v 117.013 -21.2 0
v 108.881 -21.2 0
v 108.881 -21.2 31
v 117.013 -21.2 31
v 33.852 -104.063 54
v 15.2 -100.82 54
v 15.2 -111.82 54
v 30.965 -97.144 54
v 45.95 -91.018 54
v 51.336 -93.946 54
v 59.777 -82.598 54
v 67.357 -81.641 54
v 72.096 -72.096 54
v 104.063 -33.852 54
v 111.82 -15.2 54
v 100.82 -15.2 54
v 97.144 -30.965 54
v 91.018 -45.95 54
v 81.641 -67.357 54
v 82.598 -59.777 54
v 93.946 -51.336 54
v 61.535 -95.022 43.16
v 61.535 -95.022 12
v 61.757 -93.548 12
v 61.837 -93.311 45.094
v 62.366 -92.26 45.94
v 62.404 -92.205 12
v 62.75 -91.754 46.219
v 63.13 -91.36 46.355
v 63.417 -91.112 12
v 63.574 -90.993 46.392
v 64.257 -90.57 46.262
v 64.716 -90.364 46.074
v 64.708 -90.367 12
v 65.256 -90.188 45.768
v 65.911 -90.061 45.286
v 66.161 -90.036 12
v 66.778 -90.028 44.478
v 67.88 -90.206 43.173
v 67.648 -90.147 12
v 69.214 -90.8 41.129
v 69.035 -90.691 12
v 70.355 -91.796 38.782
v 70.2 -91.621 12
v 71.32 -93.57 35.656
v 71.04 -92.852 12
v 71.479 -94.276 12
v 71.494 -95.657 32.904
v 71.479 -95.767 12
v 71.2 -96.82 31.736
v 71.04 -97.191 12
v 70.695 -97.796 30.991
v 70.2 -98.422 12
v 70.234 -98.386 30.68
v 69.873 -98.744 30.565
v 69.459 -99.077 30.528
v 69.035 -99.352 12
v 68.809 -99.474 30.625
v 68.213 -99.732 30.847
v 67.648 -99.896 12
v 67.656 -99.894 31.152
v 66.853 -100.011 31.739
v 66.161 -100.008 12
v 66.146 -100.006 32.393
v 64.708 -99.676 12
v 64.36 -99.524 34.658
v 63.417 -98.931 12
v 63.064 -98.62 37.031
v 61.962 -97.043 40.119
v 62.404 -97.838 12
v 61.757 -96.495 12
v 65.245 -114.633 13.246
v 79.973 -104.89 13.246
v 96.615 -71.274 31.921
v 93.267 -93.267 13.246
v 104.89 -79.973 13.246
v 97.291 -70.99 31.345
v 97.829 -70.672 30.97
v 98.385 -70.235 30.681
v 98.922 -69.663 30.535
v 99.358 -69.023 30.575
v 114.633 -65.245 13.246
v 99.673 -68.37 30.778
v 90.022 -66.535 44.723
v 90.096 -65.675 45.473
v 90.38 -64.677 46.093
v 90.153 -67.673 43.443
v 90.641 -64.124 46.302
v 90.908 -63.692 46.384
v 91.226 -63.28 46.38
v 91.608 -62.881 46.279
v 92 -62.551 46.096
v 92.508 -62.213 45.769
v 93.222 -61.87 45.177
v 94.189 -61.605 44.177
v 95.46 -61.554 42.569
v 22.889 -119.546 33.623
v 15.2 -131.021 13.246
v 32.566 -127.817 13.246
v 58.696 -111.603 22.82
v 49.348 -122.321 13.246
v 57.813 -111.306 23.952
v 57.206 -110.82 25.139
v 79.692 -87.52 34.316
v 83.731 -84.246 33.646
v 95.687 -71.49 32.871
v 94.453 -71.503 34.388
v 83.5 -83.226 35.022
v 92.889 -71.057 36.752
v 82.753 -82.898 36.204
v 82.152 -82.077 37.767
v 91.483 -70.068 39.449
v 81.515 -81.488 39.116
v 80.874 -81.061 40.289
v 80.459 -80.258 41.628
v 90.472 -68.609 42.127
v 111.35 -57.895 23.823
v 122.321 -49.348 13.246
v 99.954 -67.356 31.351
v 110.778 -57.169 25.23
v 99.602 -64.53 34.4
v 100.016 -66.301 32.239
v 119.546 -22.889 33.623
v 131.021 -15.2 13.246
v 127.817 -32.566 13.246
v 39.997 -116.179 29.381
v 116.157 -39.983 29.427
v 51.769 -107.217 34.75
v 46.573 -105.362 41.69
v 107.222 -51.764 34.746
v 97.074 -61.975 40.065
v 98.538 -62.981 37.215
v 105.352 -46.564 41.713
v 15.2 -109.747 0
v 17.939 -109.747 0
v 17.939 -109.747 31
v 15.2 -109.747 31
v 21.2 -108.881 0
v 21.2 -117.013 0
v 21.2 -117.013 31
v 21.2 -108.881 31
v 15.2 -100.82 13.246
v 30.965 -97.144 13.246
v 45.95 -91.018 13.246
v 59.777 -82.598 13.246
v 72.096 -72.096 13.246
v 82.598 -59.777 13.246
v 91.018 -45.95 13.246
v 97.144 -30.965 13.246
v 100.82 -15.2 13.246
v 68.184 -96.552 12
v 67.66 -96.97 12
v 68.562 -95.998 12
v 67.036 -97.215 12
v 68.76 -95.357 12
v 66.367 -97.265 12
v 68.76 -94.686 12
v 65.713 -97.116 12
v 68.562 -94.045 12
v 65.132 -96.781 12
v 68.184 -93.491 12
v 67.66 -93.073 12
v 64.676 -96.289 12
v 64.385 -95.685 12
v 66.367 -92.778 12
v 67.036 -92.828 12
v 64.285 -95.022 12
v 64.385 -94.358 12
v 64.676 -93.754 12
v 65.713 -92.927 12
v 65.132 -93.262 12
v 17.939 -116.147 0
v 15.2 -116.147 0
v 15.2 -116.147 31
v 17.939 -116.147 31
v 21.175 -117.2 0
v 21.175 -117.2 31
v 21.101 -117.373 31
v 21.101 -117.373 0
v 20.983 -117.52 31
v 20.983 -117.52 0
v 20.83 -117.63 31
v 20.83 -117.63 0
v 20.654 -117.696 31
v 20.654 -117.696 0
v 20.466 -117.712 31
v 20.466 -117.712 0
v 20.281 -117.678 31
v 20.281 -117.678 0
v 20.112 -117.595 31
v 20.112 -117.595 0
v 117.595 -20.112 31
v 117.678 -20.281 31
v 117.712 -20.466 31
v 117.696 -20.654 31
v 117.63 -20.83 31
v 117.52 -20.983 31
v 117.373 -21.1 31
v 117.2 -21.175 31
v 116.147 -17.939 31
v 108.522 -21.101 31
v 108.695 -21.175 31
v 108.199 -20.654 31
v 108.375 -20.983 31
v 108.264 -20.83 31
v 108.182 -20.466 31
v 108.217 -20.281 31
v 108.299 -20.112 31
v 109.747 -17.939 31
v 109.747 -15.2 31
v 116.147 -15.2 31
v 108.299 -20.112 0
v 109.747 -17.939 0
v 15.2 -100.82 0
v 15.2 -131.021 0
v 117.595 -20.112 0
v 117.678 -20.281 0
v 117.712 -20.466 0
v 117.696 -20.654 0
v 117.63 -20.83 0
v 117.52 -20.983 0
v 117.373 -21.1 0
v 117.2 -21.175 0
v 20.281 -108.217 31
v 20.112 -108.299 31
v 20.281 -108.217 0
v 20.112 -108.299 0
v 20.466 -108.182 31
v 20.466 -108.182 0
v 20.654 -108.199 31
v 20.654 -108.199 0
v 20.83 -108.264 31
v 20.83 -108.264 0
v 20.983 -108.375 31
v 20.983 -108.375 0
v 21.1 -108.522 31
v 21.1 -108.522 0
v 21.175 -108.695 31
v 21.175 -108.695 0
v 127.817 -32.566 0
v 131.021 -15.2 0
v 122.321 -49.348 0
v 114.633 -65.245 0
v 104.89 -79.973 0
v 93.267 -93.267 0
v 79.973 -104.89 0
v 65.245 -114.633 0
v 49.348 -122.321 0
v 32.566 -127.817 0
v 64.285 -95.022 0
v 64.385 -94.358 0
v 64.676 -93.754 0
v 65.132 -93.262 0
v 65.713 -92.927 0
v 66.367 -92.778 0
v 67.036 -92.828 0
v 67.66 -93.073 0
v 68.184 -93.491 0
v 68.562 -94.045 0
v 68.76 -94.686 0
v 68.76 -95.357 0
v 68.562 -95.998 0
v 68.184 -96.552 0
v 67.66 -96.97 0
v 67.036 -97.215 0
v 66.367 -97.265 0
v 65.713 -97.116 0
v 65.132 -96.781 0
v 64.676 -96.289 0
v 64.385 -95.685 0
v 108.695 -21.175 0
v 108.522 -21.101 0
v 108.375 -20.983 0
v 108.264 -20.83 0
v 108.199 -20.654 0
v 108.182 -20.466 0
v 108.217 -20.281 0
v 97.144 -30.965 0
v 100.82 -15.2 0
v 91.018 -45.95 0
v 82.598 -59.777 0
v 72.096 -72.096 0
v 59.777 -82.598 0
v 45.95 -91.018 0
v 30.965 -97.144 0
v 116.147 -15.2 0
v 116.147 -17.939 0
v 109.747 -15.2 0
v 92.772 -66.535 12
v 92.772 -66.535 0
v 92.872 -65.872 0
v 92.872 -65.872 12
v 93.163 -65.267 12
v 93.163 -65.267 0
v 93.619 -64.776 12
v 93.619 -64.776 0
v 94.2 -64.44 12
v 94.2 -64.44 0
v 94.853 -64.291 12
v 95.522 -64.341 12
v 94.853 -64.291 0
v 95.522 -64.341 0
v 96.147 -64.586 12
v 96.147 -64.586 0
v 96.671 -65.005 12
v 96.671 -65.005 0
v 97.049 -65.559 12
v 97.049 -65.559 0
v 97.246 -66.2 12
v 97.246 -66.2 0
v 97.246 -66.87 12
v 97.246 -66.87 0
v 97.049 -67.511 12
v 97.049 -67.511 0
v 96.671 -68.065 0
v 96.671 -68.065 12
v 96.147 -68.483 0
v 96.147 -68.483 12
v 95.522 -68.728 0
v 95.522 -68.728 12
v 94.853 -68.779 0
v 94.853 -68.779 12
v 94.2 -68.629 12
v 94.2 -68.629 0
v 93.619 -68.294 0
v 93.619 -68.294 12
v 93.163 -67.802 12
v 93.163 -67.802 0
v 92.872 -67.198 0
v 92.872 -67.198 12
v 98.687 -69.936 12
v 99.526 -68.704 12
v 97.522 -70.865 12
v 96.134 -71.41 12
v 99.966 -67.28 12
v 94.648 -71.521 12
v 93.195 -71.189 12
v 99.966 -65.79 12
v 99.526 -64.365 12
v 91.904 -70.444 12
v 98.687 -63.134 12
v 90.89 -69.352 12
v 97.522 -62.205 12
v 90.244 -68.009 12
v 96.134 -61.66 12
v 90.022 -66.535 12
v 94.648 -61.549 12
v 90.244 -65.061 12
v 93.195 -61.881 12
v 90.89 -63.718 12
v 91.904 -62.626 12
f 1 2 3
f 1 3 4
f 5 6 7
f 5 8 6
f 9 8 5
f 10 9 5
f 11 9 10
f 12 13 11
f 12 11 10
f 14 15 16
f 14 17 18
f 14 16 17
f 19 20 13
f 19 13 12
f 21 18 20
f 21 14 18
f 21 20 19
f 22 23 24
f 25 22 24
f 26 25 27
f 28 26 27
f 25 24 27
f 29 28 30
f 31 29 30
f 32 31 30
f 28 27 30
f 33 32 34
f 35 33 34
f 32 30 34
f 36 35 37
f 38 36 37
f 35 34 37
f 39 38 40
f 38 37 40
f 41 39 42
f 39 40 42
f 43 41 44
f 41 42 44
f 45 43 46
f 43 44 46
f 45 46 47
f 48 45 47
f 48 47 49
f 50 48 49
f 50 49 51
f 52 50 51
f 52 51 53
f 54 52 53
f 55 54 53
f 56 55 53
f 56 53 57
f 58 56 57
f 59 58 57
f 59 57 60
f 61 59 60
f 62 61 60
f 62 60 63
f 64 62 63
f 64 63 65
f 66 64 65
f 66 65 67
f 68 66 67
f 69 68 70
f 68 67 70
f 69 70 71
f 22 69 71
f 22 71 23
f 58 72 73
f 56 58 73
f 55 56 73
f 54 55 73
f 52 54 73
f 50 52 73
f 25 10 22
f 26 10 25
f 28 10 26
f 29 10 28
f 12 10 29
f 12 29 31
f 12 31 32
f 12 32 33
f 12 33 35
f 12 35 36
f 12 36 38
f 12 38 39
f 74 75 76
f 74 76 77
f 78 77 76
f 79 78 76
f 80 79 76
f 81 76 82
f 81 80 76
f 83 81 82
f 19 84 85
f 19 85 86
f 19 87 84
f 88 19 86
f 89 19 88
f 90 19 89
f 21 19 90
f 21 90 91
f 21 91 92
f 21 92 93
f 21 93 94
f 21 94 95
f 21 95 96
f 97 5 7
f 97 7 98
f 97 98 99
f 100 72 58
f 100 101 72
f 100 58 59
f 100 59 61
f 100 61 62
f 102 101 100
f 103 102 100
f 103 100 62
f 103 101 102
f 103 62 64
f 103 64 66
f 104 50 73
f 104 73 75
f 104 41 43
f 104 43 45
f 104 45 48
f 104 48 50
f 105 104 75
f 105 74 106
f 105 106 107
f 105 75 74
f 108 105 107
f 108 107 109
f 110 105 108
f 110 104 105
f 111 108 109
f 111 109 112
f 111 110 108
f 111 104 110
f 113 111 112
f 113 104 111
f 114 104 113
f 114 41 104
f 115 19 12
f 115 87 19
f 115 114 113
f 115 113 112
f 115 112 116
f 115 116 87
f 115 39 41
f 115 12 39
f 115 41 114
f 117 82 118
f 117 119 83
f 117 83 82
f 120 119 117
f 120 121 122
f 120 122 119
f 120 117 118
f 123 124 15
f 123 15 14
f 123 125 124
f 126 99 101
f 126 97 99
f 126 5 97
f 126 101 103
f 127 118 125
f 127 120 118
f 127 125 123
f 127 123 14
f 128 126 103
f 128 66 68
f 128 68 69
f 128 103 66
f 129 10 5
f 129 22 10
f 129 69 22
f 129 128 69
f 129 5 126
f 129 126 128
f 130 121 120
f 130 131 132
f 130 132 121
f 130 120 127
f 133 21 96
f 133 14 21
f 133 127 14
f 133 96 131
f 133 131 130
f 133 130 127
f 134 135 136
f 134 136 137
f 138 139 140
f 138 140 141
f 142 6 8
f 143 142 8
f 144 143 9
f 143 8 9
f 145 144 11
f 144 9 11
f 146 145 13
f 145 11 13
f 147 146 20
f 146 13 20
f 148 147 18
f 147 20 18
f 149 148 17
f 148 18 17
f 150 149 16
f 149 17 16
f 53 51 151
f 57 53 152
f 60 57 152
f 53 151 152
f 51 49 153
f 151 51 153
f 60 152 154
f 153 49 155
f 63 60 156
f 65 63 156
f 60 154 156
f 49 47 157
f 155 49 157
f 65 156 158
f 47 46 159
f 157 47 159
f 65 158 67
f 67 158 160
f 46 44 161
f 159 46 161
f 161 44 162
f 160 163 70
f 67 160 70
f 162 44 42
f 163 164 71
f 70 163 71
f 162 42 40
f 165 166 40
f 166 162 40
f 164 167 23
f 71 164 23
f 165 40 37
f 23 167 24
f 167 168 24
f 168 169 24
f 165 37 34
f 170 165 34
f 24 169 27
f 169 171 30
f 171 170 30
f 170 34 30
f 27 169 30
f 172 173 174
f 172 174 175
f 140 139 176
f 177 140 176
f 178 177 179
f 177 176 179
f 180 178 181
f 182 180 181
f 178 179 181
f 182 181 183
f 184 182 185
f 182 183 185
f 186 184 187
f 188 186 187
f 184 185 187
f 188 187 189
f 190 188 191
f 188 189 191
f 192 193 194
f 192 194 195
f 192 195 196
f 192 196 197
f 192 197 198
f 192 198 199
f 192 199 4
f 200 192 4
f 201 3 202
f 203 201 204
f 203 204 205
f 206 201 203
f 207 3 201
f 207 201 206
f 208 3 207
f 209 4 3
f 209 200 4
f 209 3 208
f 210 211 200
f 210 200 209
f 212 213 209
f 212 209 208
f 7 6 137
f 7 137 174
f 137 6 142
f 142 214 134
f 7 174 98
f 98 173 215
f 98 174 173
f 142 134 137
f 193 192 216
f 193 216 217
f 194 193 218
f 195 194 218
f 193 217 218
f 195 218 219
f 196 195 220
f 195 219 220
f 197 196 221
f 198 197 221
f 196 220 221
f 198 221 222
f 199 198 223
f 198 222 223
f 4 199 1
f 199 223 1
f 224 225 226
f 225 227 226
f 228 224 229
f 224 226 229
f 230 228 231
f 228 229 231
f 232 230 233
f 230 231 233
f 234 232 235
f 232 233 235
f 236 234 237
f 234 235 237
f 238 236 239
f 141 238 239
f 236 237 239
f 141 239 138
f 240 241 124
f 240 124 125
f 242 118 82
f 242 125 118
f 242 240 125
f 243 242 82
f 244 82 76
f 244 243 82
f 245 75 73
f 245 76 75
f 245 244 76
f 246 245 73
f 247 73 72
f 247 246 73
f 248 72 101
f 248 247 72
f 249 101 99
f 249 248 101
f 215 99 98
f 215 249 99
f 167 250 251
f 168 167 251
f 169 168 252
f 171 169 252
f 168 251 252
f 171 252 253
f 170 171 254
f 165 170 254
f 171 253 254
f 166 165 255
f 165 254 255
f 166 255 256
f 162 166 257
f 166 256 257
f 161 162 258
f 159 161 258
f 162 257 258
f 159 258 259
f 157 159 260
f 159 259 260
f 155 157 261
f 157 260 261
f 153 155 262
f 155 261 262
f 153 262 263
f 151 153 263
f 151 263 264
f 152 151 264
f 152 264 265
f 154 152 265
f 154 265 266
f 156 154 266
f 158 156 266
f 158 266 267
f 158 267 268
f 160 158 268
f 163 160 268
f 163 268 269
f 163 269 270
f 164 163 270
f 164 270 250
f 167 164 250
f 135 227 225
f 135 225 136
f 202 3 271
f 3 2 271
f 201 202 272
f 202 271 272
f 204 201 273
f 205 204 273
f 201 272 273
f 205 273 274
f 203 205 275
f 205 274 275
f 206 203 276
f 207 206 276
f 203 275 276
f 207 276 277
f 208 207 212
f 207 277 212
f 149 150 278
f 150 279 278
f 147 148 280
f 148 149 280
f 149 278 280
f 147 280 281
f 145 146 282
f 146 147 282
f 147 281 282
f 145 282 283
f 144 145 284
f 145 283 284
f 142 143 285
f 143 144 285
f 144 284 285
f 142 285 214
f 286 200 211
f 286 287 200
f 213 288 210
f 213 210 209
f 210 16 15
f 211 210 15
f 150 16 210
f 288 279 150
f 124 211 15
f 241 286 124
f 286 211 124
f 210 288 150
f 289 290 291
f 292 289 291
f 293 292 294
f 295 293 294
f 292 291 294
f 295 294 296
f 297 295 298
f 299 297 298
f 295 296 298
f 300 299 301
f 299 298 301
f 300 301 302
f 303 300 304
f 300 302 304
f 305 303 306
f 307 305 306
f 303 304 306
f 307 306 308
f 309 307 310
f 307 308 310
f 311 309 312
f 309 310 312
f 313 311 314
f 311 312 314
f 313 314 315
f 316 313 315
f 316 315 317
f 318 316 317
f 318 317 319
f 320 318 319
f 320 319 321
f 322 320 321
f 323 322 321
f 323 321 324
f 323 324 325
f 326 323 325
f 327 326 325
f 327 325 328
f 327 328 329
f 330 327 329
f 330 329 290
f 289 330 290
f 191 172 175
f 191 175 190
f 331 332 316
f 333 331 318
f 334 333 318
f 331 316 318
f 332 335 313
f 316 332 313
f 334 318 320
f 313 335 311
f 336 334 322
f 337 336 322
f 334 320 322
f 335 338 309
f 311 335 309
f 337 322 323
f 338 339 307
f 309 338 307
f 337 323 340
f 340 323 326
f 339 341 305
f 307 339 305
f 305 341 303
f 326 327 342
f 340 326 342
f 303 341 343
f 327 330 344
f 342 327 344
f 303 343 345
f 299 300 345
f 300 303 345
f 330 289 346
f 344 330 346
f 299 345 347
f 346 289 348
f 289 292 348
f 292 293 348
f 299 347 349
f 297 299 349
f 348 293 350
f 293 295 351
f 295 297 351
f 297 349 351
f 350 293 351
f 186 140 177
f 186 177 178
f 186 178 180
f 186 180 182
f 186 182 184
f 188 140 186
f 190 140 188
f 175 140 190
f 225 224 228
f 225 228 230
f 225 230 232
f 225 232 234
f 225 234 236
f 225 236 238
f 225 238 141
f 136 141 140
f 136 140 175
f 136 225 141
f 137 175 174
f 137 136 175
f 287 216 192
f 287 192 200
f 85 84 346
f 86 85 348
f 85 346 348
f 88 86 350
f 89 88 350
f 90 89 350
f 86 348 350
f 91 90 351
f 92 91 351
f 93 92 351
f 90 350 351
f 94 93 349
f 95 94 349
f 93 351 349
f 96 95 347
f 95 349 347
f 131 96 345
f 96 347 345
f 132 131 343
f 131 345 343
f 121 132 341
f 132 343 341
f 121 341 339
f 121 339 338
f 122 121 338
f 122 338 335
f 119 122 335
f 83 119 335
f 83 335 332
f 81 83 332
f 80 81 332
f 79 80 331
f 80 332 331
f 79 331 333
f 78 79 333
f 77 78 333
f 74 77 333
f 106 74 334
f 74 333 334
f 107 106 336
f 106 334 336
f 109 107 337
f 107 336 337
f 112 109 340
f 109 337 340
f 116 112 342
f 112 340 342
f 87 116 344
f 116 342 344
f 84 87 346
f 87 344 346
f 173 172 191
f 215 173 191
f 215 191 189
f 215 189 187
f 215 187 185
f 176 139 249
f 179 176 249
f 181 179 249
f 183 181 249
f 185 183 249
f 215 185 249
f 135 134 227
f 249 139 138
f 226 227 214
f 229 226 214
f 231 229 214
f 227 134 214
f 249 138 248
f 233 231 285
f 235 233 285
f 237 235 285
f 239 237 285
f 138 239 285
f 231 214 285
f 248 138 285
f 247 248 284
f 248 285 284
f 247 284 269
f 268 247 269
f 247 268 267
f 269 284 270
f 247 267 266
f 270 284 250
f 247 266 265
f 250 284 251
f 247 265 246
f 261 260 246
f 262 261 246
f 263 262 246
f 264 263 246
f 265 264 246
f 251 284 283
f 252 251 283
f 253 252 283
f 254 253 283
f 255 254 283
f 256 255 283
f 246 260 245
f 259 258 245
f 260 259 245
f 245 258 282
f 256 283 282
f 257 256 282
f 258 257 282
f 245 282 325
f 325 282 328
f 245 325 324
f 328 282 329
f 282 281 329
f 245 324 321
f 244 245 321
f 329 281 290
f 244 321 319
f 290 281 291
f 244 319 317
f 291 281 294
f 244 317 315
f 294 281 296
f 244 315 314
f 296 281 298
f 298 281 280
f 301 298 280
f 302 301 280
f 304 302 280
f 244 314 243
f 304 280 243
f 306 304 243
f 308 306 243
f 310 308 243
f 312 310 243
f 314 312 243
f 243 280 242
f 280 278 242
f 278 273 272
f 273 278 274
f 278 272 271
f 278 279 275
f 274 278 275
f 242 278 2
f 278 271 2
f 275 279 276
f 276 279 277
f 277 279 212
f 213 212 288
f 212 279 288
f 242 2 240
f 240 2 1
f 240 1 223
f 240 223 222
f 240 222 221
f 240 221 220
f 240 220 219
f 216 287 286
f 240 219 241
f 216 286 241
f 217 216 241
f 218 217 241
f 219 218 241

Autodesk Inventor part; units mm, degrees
ref_plane "YZ Plane" through (0, 0, 0) normal (1, 0, 0) x (0, 1, 0)
ref_plane "Płaszczyzna konstrukcyjna1" through (0, 0, 0) normal (0, 0, 1) x (1, 0, 0)
sketch "Szkic1" plane through (0, 0, 0) normal (0, 0, 1) x (1, 0, 0)
  arc A0 (15, -100.85) -> (100.85, -15) centre (0, 0) ccw projected
  arc A1 (15, -131.0443) -> (131.0443, -15) centre (0, 0) ccw projected
  line L0 (100.85, -15) -> (111.85, -15) projected
  line L1 (15, -100.85) -> (15, -111.85) projected
  line L2 (15.2, -100.8201) -> (15.2, -131.0213)
  line L3 (100.8201, -15.2) -> (131.0213, -15.2)
  point P0 (0, 0)
  dimension "d0" = 0.2
  dimension "d1" = 0.2
extrude "Wyciągnięcie proste1" add sketch "Szkic1" along normal up to surface (13.2464 mm away)
sketch "Szkic2" plane through (100.8201, -15.2, 13.2464) normal (0, 0, 1) x (1, 0, 0)
  line L0 (0, 0) -> (30.2012, 0) projected
  arc A0 (-85.6201, -85.6201) -> (0, 0) centre (-100.8201, 15.2) ccw projected
  line L1 (-85.6201, -115.8213) -> (-85.6201, -85.6201) projected
  arc A1 (-85.6201, -115.8213) -> (30.2012, 0) centre (-100.8201, 15.2) ccw projected
ref_plane "Płaszczyzna konstrukcyjna2" through (15, -111.85, 54) normal (0, 0, 1) x (1, 0, 0)
sketch "Szkic3" plane through (15, -111.85, 54) normal (0, 0, 1) x (1, 0, 0)
  arc A0 (0.2, 11.0299) -> (85.8201, 96.65) centre (-15, 111.85) ccw projected
  line L0 (0.2, -19.1713) -> (0.2, 11.0299) projected
  line L1 (85.8201, 96.65) -> (116.0213, 96.65) projected
  line L2 (0.2, 11.0299) -> (0.2, 0.0299)
  line L3 (0.2, -19.1713) -> (0.2, 11.0299) projected
  line L4 (85.8201, 96.65) -> (116.0213, 96.65) projected
  line L5 (85.8201, 96.65) -> (96.8201, 96.65)
  arc A1 (0.2, 0.0299) -> (96.8201, 96.65) centre (-49.8701, 146.7201) ccw
  point P0 (-15, 111.85)
  dimension "d4" = 11
  dimension "d5" = 11
  dimension "d6" = 155
loft "Wyciągnięcie złożone1" add profiles "Szkic2", "Szkic3"
sketch "Szkic7" plane through (0, 0, 0) normal (0, 0, -1) x (-1, 0, 0)
  line L0 (-109.9472, -18) -> (-109.9472, -15) projected
  line L1 (-108.4654, -20.2226) -> (-109.9472, -18) projected
  line L2 (-115.9472, -15) -> (-115.9472, -18) projected
  line L3 (-115.9472, -18) -> (-117.4289, -20.2226) projected
  arc A0 (-117.4289, -20.2226) -> (-117.0129, -21) centre (-117.0129, -20.5) ccw projected
  line L4 (-117.0129, -21) -> (-108.8814, -21) projected
  arc A1 (-108.8814, -21) -> (-108.4654, -20.2226) centre (-108.8814, -20.5) ccw projected
  line L5 (-100.8201, -15.2) -> (-131.0213, -15.2) projected
  line L6 (-18, -115.9472) -> (-15, -115.9472) projected
  line L7 (-20.2226, -117.4289) -> (-18, -115.9472) projected
  arc A2 (-21, -117.0129) -> (-20.2226, -117.4289) centre (-20.5, -117.0129) ccw projected
  line L8 (-21, -108.8814) -> (-21, -117.0129) projected
  arc A3 (-20.2226, -108.4654) -> (-21, -108.8814) centre (-20.5, -108.8814) ccw projected
  line L9 (-18, -109.9472) -> (-20.2226, -108.4654) projected
  line L10 (-15, -109.9472) -> (-18, -109.9472) projected
  line L11 (-15.2, -131.0213) -> (-15.2, -100.8201) projected
  line L12 (-15, -116.1472) -> (-17.9394, -116.1472)
  line L13 (-17.9394, -116.1472) -> (-20.1117, -117.5953)
  arc A4 (-21.2, -117.0129) -> (-20.1117, -117.5953) centre (-20.5, -117.0129) ccw
  line L14 (-21.2, -117.0129) -> (-21.2, -108.8814)
  arc A5 (-20.1117, -108.299) -> (-21.2, -108.8814) centre (-20.5, -108.8814) ccw
  line L15 (-20.1117, -108.299) -> (-17.9394, -109.7472)
  line L16 (-17.9394, -109.7472) -> (-15, -109.7472)
  line L17 (-109.7472, -15) -> (-109.7472, -17.9394)
  line L18 (-109.7472, -17.9394) -> (-108.299, -20.1117)
  arc A6 (-108.8814, -21.2) -> (-108.299, -20.1117) centre (-108.8814, -20.5) ccw
  line L19 (-108.8814, -21.2) -> (-117.0129, -21.2)
  arc A7 (-117.5953, -20.1117) -> (-117.0129, -21.2) centre (-117.0129, -20.5) ccw
  line L20 (-117.5953, -20.1117) -> (-116.1472, -17.9394)
  line L21 (-116.1472, -17.9394) -> (-116.1472, -15)
  line L22 (-116.1472, -15) -> (-109.7472, -15)
  line L23 (-15, -116.1472) -> (-15, -109.7472)
  point P0 (0, 0)
  dimension "d40" = 0.2
  dimension "d41" = 0.2
  dimension "d42" = 0.2
extrude "Wyciągnięcie proste6" cut sketch "Szkic7" against normal blind 31
sketch "Szkic5" plane through (0, 0, 0) normal (0, 0, -1) x (-1, 0, 0)
  circle A0 centre (-95.0216, -66.5349) radius 2.25 projected
  circle A1 centre (-66.5349, -95.0216) radius 2.25 projected
  point P0 (0, 0)
extrude "Wyciągnięcie proste4" cut sketch "Szkic5" against normal through all
ref_plane "Płaszczyzna konstrukcyjna3" through (0, 0, 12) normal (0, 0, -1) x (-1, 0, 0)
sketch "Szkic6" plane through (0, 0, 12) normal (0, 0, -1) x (-1, 0, 0)
  spline S0 degree 2 poles (-64.2849, -95.0216) (-64.2849, -91.1245) (-67.6599, -93.0731) (-71.0349, -95.0216) (-67.6599, -96.9702) (-64.2849, -98.9188) (-64.2849, -95.0216) knots 0 0 0 0.333333 0.333333 0.666667 0.666667 1 1 1 weights 1 0.5 1 0.5 1 0.5 1 projected
  spline S1 degree 2 poles (-92.7716, -66.5349) (-92.7716, -62.6378) (-96.1466, -64.5863) (-99.5216, -66.5349) (-96.1466, -68.4834) (-92.7716, -70.432) (-92.7716, -66.5349) knots 0 0 0 0.333333 0.333333 0.666667 0.666667 1 1 1 weights 1 0.5 1 0.5 1 0.5 1 projected
  circle A0 centre (-95.0216, -66.5349) radius 2.25 projected
  circle A1 centre (-95.0216, -66.5349) radius 5
  circle A2 centre (-66.5349, -95.0216) radius 2.25 projected
  circle A3 centre (-66.5349, -95.0216) radius 5
  point P0 (0, 0)
  dimension "d22" = 10
  dimension "d23" = 10
extrude "Wyciągnięcie proste5" cut sketch "Szkic6" against normal through all contours S0 | S1 | A1 | A3
equation "\"d1\" = d0"
properties part number "connectro_best"
